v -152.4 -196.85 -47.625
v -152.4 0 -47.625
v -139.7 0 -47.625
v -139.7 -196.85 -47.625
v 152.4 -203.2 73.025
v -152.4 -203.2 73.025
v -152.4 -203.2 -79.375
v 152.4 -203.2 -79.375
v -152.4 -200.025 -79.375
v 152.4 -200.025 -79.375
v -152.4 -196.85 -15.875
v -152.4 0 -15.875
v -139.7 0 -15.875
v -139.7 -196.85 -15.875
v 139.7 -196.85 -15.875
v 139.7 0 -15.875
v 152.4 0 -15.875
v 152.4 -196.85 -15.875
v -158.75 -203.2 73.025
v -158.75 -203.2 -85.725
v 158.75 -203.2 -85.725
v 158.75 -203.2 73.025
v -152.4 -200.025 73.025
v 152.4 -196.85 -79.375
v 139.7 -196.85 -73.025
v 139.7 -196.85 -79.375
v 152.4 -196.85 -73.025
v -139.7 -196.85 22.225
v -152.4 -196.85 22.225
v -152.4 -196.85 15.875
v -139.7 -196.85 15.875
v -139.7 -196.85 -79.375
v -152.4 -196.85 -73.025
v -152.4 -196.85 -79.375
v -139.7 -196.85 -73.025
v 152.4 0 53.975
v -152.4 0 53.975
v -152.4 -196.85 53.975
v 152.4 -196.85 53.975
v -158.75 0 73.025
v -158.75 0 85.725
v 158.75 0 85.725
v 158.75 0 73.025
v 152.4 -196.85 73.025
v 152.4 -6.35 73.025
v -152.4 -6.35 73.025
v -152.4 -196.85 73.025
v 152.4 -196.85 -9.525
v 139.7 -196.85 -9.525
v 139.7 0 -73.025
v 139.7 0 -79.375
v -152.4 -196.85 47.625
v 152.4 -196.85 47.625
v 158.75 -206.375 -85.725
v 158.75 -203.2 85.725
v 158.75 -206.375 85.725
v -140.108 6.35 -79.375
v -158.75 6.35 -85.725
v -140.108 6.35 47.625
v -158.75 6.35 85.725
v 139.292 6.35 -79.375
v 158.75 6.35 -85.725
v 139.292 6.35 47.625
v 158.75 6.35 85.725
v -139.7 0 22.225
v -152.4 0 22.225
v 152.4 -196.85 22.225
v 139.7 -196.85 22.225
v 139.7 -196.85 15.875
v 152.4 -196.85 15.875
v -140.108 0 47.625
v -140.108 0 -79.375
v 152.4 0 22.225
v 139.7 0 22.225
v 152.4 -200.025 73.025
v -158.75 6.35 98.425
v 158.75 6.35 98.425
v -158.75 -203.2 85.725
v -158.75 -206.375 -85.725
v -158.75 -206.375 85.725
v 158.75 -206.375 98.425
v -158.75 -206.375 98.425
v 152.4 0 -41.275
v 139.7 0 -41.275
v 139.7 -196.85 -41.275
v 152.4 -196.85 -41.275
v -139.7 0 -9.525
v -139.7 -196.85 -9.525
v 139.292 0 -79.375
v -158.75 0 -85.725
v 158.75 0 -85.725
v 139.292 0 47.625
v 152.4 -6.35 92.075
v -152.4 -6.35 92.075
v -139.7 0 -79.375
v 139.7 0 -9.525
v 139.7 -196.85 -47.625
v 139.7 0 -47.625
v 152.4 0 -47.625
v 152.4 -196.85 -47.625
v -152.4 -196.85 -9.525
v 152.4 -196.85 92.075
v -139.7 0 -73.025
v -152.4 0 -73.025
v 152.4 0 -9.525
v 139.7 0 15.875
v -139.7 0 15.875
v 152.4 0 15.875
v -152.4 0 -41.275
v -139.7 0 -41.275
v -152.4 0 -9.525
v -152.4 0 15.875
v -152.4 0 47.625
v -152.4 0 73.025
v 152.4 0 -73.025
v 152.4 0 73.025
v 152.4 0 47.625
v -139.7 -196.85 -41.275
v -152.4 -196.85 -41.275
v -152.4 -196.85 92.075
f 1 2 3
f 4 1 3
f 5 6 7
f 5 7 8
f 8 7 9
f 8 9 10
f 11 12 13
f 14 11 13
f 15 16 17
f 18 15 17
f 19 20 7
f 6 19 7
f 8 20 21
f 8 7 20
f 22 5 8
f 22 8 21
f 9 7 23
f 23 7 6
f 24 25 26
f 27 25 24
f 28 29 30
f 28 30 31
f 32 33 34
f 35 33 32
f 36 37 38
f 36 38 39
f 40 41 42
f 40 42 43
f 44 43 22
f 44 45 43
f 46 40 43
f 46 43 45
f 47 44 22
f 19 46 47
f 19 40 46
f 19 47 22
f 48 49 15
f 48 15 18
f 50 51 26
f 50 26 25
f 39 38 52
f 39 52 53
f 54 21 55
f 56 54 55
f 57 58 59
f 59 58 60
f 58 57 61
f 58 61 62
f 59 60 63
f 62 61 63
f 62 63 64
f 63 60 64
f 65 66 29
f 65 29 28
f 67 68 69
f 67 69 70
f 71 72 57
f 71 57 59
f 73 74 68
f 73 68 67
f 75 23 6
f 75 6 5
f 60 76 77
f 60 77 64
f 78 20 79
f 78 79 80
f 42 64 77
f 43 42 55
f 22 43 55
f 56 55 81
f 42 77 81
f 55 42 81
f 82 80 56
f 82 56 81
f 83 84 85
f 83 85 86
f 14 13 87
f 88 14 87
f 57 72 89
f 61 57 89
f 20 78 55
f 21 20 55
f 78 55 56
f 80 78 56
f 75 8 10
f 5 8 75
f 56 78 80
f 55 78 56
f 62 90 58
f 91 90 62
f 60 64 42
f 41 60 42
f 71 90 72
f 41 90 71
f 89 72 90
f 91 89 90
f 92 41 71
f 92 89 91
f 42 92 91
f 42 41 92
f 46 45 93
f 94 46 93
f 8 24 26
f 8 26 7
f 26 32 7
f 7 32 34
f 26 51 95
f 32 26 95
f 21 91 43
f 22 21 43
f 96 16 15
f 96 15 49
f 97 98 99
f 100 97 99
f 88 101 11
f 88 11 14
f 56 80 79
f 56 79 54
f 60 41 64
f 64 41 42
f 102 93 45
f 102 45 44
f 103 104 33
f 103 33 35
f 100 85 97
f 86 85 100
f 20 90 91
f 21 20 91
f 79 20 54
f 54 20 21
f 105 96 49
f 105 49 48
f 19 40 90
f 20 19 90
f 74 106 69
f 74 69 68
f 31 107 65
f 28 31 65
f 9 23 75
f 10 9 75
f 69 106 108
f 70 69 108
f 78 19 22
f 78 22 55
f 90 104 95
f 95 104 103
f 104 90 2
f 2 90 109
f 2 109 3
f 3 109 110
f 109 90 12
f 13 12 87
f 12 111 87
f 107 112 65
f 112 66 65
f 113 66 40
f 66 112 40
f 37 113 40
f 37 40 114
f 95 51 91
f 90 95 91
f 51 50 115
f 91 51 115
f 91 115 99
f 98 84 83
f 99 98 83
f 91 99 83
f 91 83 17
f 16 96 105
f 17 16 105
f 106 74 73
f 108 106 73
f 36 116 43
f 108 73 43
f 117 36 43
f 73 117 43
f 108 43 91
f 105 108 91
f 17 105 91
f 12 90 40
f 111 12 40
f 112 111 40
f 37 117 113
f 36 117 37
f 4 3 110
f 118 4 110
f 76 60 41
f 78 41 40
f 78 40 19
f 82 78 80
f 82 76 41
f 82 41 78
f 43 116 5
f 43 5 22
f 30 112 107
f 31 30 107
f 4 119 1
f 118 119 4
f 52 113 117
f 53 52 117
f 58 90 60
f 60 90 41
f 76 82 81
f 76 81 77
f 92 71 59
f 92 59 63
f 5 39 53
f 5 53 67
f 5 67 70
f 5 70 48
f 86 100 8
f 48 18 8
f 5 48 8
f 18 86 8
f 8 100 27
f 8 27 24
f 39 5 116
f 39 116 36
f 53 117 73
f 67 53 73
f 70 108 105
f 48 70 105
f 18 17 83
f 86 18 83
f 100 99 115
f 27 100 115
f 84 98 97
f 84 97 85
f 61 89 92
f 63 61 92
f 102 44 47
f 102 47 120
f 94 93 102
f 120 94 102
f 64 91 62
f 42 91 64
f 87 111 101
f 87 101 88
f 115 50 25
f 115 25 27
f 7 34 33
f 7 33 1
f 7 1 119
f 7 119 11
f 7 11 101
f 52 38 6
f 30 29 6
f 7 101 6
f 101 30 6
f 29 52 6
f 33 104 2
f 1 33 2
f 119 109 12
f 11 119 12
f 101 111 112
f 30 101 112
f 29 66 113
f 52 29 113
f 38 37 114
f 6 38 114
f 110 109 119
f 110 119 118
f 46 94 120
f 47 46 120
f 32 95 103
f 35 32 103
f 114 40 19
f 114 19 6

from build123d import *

# Parameters (mm, degrees)
F1_DEPTH  = 203.2
F0_W      = 304.8
F0_H      = 6.35
F0_W_2    = 12.7
F2_DEPTH  = 196.85
F5_W      = 317.5
F5_H      = 171.45
F5_W_2    = 304.7999936342
F5_H_2    = 158.7499936342
F6_DEPTH  = 3.175
F8_W      = 317.5
F8_H      = 171.45
F8_W_2    = 279.4
F8_H_2    = 127
F9_DEPTH  = 6.35
F10_DEPTH = 3.175
F11_W     = 317.5
F11_H     = 203.2
F12_DEPTH = 25.4
F14_W     = 190.5
F14_H     = 6.35
F14_H_2   = 19.05
F15_DEPTH = 317.5
F16_START = -6.35
F16_DEPTH = 304.8


with BuildPart() as f1:
    # F0 (on Front) → F1 (new body)
    with BuildSketch(Plane.XZ):
        Polygon((158.75, 85.725), (-158.75, 85.725), (-158.75, -79.375), (-158.75, -85.725), (158.75, -85.725), align=None)
        Polygon((-152.4, 53.975), (-152.4, 79.375), (152.4, 79.375), (152.4, 53.975), (152.4, 47.625), (152.4, 22.225), (152.4, 15.875), (152.4, -9.525), (152.4, -15.875), (152.4, -41.275), (152.4, -47.625), (152.4, -73.025), (152.4, -79.375), (139.7, -79.375), (-139.7, -79.375), (-152.4, -79.375), (-152.4, -73.025), (-152.4, -47.625), (-152.4, -41.275), (-152.4, -15.875), (-152.4, -9.525), (-152.4, 15.875), (-152.4, 22.225), (-152.4, 47.625), align=None, mode=Mode.SUBTRACT)
    extrude(amount=F1_DEPTH)

    # F0 (on Front) → F2 (join)
    with BuildSketch(Plane.XZ):
        with Locations((0, 50.8)):
            Rectangle(F0_W, F0_H)
        with Locations((-146.05, -12.7)):
            Rectangle(F0_W_2, F0_H)
        with Locations((-146.05, -44.45)):
            Rectangle(F0_W_2, F0_H)
        with Locations((-146.05, -76.2)):
            Rectangle(F0_W_2, F0_H)
        with Locations((146.05, -76.2)):
            Rectangle(F0_W_2, F0_H)
        with Locations((146.05, -44.45)):
            Rectangle(F0_W_2, F0_H)
        with Locations((146.05, -12.7)):
            Rectangle(F0_W_2, F0_H)
        with Locations((-146.05, 19.05)):
            Rectangle(F0_W_2, F0_H)
        with Locations((146.05, 19.05)):
            Rectangle(F0_W_2, F0_H)
    extrude(amount=F2_DEPTH)


with BuildPart() as f6:
    # F5 (on offset) → F6 (new body)
    with BuildSketch(Plane.XZ.offset(203.2)):
        Rectangle(F5_W, F5_H)
        Rectangle(F5_W_2, F5_H_2, mode=Mode.SUBTRACT)
        Rectangle(F5_W_2, F5_H_2)
    extrude(amount=F6_DEPTH)


with BuildPart() as f9:
    # F8 (on offset) → F9 (new body)
    with BuildSketch(Plane.XZ):
        Rectangle(F8_W, F8_H)
        with Locations((-0.4077010231, -15.875)):
            Rectangle(F8_W_2, F8_H_2, mode=Mode.SUBTRACT)
    extrude(amount=-F9_DEPTH)


with BuildPart() as f10:
    # F5 (on offset) → F10 (new body)
    with BuildSketch(Plane.XZ.offset(203.2)):
        Rectangle(F5_W_2, F5_H_2)
    extrude(amount=-F10_DEPTH)


with BuildPart() as f12_tool:
    # F11 (on offset) → F12 (new body)
    with BuildSketch(Plane.XY.offset(73.025)):
        with Locations((0, -101.6)):
            Rectangle(F11_W, F11_H)
    extrude(amount=F12_DEPTH)


with BuildPart() as f1_1:
    add(f1.part)

    # F12: cut by f12_tool
    add(f12_tool.part, mode=Mode.SUBTRACT)


with BuildPart() as f10_1:
    add(f10.part)

    # F12: cut by f12_tool
    add(f12_tool.part, mode=Mode.SUBTRACT)


with BuildPart() as f15:
    # F14 (on offset) → F15 (new body, through all)
    with BuildSketch(Plane(origin=(-158.75, 0, 0), x_dir=(0, -1, 0), z_dir=(-1, 0, 0))):
        Polygon((-6.35, 98.425), (-6.35, 85.725), (0, 85.725), (0, 73.025), (6.35, 73.025), (6.35, 92.075), (6.35, 98.425), align=None)
        with Locations((101.6, 95.25)):
            Rectangle(F14_W, F14_H)
        Polygon((206.375, 98.425), (196.85, 98.425), (196.85, 92.075), (196.85, 73.025), (203.2, 73.025), (203.2, 85.725), (206.375, 85.725), align=None)
        with Locations((101.6, 82.55)):
            Rectangle(F14_W, F14_H_2)
    extrude(amount=-F15_DEPTH)

    # F14 (on offset) → F16 (cut)
    with BuildSketch(Plane(origin=(-158.75, 0, 0), x_dir=(0, -1, 0), z_dir=(-1, 0, 0)).offset(F16_START)):
        with Locations((101.6, 82.55)):
            Rectangle(F14_W, F14_H_2)
    extrude(amount=-F16_DEPTH, mode=Mode.SUBTRACT)


solid = Compound([f6.part, f9.part, f1_1.part, f10_1.part, f15.part])
